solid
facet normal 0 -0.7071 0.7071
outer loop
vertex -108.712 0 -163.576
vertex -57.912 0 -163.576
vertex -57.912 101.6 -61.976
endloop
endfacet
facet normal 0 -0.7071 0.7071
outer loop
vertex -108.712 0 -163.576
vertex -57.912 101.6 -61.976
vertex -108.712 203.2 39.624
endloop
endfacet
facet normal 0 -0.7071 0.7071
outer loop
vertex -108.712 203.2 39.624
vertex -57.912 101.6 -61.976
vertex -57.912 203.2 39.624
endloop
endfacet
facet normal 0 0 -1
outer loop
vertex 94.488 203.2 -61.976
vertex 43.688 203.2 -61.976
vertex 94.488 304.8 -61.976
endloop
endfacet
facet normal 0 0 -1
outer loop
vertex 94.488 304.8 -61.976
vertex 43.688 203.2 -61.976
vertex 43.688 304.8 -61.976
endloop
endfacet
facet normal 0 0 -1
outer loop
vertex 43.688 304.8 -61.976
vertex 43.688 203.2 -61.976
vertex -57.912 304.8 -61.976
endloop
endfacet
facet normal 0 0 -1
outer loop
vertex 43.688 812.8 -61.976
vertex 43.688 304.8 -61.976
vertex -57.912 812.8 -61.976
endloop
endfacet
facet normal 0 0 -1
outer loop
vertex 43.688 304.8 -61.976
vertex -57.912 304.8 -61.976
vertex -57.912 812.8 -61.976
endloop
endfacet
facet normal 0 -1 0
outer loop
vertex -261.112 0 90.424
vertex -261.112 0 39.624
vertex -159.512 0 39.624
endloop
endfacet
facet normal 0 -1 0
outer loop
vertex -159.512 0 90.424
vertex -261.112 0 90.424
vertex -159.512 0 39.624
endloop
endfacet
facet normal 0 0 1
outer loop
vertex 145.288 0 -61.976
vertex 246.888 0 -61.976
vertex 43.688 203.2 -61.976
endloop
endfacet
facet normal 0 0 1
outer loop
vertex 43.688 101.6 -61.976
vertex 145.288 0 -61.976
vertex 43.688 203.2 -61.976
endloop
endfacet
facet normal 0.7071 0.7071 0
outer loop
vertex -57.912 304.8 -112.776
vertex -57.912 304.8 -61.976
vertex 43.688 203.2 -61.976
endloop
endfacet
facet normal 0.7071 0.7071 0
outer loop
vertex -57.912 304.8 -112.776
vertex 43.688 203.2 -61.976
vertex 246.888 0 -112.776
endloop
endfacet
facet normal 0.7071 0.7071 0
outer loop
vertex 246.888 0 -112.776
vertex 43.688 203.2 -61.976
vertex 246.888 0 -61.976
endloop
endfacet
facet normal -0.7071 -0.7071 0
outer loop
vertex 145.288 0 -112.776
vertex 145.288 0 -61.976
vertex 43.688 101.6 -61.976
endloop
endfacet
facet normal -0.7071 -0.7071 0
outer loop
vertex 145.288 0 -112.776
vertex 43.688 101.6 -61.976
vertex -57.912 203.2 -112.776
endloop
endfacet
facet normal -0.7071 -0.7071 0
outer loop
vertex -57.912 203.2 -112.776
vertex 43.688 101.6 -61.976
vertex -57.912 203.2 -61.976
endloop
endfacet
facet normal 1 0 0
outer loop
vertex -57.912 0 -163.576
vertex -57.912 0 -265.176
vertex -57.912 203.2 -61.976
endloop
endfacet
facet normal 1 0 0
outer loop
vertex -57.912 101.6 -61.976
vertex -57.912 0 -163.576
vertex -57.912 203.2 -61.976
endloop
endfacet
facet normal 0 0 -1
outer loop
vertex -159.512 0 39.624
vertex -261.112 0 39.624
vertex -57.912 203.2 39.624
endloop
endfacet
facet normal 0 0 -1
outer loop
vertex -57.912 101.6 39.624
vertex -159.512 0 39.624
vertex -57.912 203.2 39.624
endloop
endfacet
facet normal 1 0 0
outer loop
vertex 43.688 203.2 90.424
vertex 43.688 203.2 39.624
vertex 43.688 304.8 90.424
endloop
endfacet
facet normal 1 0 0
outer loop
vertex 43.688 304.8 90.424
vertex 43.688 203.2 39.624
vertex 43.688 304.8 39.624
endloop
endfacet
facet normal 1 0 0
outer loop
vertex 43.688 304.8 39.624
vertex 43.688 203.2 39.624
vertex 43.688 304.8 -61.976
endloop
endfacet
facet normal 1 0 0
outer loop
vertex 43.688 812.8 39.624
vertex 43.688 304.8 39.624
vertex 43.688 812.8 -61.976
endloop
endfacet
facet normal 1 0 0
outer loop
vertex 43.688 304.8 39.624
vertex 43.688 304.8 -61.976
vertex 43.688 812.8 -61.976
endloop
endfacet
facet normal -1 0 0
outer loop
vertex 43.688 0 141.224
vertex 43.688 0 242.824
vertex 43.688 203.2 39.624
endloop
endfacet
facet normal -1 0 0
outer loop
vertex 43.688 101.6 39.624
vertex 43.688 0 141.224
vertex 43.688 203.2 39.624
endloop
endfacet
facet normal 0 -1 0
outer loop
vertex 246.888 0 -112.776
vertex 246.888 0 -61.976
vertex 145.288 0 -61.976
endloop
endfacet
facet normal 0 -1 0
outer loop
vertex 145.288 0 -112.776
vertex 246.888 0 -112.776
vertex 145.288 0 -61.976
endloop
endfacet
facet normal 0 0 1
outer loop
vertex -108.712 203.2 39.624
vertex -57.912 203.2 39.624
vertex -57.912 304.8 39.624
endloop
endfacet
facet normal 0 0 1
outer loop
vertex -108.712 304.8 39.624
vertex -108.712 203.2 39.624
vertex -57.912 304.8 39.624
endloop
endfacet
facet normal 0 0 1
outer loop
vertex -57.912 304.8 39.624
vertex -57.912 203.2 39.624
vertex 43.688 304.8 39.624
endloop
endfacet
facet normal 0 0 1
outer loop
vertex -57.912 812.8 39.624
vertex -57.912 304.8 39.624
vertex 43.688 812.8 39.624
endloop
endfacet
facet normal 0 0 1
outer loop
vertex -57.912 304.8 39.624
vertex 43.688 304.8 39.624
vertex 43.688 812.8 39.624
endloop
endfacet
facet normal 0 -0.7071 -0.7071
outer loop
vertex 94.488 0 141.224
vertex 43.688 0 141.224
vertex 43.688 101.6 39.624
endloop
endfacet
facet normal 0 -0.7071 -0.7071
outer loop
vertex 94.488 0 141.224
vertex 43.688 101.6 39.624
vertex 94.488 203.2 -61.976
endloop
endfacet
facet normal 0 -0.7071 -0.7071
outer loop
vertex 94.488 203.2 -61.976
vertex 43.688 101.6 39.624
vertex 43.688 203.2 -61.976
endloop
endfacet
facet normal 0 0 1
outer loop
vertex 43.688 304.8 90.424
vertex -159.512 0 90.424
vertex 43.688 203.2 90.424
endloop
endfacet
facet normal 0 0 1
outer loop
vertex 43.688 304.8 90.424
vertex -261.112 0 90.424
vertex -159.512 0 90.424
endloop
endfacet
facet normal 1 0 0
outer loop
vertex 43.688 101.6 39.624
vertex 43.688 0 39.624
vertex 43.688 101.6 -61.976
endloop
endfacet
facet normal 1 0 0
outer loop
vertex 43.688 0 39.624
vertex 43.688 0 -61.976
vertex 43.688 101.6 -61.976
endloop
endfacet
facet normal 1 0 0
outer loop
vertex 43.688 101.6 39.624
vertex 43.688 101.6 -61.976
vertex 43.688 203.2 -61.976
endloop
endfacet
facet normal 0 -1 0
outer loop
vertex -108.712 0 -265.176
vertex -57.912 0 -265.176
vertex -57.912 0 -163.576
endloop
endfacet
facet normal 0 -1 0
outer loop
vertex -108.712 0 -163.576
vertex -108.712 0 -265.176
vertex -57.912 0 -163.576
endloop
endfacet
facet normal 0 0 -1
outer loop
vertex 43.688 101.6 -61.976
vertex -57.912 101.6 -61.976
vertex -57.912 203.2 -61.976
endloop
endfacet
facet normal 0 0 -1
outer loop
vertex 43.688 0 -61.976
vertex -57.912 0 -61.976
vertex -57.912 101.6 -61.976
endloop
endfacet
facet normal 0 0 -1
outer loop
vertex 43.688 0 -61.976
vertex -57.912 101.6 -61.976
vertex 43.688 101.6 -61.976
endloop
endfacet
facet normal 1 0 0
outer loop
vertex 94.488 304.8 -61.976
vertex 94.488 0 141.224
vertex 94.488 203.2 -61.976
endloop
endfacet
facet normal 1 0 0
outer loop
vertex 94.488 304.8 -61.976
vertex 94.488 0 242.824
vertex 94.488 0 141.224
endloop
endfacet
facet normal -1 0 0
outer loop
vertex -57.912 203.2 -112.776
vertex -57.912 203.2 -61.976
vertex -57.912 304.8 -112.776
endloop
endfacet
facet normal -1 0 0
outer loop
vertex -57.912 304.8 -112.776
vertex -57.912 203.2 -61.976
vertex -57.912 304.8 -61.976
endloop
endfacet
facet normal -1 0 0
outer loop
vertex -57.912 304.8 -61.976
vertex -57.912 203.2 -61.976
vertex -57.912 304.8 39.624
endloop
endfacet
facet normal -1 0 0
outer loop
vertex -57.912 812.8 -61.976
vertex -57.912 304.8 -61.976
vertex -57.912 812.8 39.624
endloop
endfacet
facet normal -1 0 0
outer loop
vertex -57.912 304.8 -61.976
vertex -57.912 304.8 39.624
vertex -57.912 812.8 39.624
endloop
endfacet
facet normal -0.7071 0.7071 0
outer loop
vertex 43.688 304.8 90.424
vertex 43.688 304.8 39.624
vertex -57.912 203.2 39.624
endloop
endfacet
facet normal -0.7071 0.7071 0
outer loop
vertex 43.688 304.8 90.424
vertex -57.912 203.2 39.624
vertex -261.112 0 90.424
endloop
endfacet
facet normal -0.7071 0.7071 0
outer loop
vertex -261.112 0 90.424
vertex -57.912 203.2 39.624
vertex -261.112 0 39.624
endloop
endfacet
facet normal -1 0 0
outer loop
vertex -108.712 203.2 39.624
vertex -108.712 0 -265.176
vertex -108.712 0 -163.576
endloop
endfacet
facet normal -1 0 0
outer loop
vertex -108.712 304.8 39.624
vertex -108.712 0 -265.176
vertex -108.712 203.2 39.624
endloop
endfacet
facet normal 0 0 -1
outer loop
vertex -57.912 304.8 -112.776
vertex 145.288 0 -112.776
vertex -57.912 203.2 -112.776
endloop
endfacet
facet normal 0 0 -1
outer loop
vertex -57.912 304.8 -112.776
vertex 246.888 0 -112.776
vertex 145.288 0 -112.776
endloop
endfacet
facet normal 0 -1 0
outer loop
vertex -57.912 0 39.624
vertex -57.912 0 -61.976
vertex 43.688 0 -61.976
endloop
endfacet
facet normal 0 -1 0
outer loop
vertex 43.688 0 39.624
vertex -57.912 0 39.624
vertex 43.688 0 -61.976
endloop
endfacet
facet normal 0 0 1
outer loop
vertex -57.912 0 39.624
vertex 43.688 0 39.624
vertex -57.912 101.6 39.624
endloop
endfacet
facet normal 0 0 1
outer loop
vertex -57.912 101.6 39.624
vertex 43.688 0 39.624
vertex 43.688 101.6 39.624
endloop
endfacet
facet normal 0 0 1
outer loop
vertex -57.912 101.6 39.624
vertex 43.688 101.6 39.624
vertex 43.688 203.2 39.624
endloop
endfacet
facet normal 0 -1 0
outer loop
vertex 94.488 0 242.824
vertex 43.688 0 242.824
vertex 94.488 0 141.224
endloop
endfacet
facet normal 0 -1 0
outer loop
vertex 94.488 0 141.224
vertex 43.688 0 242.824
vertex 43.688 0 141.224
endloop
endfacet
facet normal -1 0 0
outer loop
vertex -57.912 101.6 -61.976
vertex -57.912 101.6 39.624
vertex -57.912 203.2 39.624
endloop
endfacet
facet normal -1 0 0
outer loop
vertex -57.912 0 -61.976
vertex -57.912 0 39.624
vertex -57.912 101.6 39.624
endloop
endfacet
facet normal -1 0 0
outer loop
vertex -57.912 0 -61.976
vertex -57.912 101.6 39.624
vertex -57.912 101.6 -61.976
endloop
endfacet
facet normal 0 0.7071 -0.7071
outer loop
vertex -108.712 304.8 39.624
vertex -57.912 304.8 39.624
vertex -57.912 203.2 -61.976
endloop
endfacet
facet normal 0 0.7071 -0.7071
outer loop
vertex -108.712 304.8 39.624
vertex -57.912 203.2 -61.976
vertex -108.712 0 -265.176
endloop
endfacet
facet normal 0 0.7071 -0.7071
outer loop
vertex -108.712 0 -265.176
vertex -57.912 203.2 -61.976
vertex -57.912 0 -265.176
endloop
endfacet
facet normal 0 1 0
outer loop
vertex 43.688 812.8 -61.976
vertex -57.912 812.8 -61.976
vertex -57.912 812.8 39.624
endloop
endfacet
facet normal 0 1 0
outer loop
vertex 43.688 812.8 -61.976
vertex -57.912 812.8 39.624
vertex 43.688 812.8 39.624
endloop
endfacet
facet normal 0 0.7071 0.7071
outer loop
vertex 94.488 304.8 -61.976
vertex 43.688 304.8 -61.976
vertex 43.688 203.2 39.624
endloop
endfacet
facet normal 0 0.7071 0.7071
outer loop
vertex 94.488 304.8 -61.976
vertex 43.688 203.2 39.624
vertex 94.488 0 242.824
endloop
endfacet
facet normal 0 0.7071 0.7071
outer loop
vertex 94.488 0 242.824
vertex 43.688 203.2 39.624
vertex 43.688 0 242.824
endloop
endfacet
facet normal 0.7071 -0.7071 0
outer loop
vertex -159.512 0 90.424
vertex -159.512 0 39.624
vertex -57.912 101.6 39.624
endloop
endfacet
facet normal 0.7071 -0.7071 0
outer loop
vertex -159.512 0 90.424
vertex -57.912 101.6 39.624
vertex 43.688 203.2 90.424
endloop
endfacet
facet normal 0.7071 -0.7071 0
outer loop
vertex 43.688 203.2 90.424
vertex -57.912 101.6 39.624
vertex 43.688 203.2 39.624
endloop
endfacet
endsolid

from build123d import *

# Parameters (mm, degrees)
SKETCH1_W           = 101.6
SKETCH1_H           = 101.6
BOSS_EXTRUDE1_DEPTH = 812.8
BOSS_EXTRUDE2_DEPTH = 50.8
BOSS_EXTRUDE3_DEPTH = 50.8
BOSS_EXTRUDE4_DEPTH = 50.8
BOSS_EXTRUDE6_DEPTH = 50.8


with BuildPart() as part:
    # Sketch1 → Boss-Extrude1 (new body)
    with BuildSketch(Plane(origin=(0, 0, 0), x_dir=(1, 0, 0), z_dir=(0, 1, 0))):
        with Locations((-7.112, 11.176)):
            Rectangle(SKETCH1_W, SKETCH1_H)
    extrude(amount=BOSS_EXTRUDE1_DEPTH)

    # Sketch2 → Boss-Extrude2 (add)
    with BuildSketch(Plane.ZY.offset(57.912)):
        Polygon((-163.576, 0), (39.624, 203.2), (39.624, 304.8), (-265.176, 0), align=None)
    extrude(amount=BOSS_EXTRUDE2_DEPTH)

    # Sketch3 → Boss-Extrude3 (add)
    with BuildSketch(Plane(origin=(0, 0, -61.976), x_dir=(-1, 0, 0), z_dir=(0, 0, -1))):
        Polygon((-145.288, 0), (57.912, 203.2), (57.912, 304.8), (-246.888, 0), align=None)
    extrude(amount=BOSS_EXTRUDE3_DEPTH)

    # Sketch5 → Boss-Extrude4 (add)
    with BuildSketch(Plane.XY.offset(39.624)):
        Polygon((-159.512, 0), (43.688, 203.2), (43.688, 304.8), (-261.112, 0), align=None)
    extrude(amount=BOSS_EXTRUDE4_DEPTH)

    # Sketch7 → Boss-Extrude6 (add)
    with BuildSketch(Plane(origin=(43.688, 0, 0), x_dir=(0, 0, -1), z_dir=(1, 0, 0))):
        Polygon((-141.224, 0), (61.976, 203.2), (61.976, 304.8), (-242.824, 0), align=None)
    extrude(amount=BOSS_EXTRUDE6_DEPTH)


solid = part.part
